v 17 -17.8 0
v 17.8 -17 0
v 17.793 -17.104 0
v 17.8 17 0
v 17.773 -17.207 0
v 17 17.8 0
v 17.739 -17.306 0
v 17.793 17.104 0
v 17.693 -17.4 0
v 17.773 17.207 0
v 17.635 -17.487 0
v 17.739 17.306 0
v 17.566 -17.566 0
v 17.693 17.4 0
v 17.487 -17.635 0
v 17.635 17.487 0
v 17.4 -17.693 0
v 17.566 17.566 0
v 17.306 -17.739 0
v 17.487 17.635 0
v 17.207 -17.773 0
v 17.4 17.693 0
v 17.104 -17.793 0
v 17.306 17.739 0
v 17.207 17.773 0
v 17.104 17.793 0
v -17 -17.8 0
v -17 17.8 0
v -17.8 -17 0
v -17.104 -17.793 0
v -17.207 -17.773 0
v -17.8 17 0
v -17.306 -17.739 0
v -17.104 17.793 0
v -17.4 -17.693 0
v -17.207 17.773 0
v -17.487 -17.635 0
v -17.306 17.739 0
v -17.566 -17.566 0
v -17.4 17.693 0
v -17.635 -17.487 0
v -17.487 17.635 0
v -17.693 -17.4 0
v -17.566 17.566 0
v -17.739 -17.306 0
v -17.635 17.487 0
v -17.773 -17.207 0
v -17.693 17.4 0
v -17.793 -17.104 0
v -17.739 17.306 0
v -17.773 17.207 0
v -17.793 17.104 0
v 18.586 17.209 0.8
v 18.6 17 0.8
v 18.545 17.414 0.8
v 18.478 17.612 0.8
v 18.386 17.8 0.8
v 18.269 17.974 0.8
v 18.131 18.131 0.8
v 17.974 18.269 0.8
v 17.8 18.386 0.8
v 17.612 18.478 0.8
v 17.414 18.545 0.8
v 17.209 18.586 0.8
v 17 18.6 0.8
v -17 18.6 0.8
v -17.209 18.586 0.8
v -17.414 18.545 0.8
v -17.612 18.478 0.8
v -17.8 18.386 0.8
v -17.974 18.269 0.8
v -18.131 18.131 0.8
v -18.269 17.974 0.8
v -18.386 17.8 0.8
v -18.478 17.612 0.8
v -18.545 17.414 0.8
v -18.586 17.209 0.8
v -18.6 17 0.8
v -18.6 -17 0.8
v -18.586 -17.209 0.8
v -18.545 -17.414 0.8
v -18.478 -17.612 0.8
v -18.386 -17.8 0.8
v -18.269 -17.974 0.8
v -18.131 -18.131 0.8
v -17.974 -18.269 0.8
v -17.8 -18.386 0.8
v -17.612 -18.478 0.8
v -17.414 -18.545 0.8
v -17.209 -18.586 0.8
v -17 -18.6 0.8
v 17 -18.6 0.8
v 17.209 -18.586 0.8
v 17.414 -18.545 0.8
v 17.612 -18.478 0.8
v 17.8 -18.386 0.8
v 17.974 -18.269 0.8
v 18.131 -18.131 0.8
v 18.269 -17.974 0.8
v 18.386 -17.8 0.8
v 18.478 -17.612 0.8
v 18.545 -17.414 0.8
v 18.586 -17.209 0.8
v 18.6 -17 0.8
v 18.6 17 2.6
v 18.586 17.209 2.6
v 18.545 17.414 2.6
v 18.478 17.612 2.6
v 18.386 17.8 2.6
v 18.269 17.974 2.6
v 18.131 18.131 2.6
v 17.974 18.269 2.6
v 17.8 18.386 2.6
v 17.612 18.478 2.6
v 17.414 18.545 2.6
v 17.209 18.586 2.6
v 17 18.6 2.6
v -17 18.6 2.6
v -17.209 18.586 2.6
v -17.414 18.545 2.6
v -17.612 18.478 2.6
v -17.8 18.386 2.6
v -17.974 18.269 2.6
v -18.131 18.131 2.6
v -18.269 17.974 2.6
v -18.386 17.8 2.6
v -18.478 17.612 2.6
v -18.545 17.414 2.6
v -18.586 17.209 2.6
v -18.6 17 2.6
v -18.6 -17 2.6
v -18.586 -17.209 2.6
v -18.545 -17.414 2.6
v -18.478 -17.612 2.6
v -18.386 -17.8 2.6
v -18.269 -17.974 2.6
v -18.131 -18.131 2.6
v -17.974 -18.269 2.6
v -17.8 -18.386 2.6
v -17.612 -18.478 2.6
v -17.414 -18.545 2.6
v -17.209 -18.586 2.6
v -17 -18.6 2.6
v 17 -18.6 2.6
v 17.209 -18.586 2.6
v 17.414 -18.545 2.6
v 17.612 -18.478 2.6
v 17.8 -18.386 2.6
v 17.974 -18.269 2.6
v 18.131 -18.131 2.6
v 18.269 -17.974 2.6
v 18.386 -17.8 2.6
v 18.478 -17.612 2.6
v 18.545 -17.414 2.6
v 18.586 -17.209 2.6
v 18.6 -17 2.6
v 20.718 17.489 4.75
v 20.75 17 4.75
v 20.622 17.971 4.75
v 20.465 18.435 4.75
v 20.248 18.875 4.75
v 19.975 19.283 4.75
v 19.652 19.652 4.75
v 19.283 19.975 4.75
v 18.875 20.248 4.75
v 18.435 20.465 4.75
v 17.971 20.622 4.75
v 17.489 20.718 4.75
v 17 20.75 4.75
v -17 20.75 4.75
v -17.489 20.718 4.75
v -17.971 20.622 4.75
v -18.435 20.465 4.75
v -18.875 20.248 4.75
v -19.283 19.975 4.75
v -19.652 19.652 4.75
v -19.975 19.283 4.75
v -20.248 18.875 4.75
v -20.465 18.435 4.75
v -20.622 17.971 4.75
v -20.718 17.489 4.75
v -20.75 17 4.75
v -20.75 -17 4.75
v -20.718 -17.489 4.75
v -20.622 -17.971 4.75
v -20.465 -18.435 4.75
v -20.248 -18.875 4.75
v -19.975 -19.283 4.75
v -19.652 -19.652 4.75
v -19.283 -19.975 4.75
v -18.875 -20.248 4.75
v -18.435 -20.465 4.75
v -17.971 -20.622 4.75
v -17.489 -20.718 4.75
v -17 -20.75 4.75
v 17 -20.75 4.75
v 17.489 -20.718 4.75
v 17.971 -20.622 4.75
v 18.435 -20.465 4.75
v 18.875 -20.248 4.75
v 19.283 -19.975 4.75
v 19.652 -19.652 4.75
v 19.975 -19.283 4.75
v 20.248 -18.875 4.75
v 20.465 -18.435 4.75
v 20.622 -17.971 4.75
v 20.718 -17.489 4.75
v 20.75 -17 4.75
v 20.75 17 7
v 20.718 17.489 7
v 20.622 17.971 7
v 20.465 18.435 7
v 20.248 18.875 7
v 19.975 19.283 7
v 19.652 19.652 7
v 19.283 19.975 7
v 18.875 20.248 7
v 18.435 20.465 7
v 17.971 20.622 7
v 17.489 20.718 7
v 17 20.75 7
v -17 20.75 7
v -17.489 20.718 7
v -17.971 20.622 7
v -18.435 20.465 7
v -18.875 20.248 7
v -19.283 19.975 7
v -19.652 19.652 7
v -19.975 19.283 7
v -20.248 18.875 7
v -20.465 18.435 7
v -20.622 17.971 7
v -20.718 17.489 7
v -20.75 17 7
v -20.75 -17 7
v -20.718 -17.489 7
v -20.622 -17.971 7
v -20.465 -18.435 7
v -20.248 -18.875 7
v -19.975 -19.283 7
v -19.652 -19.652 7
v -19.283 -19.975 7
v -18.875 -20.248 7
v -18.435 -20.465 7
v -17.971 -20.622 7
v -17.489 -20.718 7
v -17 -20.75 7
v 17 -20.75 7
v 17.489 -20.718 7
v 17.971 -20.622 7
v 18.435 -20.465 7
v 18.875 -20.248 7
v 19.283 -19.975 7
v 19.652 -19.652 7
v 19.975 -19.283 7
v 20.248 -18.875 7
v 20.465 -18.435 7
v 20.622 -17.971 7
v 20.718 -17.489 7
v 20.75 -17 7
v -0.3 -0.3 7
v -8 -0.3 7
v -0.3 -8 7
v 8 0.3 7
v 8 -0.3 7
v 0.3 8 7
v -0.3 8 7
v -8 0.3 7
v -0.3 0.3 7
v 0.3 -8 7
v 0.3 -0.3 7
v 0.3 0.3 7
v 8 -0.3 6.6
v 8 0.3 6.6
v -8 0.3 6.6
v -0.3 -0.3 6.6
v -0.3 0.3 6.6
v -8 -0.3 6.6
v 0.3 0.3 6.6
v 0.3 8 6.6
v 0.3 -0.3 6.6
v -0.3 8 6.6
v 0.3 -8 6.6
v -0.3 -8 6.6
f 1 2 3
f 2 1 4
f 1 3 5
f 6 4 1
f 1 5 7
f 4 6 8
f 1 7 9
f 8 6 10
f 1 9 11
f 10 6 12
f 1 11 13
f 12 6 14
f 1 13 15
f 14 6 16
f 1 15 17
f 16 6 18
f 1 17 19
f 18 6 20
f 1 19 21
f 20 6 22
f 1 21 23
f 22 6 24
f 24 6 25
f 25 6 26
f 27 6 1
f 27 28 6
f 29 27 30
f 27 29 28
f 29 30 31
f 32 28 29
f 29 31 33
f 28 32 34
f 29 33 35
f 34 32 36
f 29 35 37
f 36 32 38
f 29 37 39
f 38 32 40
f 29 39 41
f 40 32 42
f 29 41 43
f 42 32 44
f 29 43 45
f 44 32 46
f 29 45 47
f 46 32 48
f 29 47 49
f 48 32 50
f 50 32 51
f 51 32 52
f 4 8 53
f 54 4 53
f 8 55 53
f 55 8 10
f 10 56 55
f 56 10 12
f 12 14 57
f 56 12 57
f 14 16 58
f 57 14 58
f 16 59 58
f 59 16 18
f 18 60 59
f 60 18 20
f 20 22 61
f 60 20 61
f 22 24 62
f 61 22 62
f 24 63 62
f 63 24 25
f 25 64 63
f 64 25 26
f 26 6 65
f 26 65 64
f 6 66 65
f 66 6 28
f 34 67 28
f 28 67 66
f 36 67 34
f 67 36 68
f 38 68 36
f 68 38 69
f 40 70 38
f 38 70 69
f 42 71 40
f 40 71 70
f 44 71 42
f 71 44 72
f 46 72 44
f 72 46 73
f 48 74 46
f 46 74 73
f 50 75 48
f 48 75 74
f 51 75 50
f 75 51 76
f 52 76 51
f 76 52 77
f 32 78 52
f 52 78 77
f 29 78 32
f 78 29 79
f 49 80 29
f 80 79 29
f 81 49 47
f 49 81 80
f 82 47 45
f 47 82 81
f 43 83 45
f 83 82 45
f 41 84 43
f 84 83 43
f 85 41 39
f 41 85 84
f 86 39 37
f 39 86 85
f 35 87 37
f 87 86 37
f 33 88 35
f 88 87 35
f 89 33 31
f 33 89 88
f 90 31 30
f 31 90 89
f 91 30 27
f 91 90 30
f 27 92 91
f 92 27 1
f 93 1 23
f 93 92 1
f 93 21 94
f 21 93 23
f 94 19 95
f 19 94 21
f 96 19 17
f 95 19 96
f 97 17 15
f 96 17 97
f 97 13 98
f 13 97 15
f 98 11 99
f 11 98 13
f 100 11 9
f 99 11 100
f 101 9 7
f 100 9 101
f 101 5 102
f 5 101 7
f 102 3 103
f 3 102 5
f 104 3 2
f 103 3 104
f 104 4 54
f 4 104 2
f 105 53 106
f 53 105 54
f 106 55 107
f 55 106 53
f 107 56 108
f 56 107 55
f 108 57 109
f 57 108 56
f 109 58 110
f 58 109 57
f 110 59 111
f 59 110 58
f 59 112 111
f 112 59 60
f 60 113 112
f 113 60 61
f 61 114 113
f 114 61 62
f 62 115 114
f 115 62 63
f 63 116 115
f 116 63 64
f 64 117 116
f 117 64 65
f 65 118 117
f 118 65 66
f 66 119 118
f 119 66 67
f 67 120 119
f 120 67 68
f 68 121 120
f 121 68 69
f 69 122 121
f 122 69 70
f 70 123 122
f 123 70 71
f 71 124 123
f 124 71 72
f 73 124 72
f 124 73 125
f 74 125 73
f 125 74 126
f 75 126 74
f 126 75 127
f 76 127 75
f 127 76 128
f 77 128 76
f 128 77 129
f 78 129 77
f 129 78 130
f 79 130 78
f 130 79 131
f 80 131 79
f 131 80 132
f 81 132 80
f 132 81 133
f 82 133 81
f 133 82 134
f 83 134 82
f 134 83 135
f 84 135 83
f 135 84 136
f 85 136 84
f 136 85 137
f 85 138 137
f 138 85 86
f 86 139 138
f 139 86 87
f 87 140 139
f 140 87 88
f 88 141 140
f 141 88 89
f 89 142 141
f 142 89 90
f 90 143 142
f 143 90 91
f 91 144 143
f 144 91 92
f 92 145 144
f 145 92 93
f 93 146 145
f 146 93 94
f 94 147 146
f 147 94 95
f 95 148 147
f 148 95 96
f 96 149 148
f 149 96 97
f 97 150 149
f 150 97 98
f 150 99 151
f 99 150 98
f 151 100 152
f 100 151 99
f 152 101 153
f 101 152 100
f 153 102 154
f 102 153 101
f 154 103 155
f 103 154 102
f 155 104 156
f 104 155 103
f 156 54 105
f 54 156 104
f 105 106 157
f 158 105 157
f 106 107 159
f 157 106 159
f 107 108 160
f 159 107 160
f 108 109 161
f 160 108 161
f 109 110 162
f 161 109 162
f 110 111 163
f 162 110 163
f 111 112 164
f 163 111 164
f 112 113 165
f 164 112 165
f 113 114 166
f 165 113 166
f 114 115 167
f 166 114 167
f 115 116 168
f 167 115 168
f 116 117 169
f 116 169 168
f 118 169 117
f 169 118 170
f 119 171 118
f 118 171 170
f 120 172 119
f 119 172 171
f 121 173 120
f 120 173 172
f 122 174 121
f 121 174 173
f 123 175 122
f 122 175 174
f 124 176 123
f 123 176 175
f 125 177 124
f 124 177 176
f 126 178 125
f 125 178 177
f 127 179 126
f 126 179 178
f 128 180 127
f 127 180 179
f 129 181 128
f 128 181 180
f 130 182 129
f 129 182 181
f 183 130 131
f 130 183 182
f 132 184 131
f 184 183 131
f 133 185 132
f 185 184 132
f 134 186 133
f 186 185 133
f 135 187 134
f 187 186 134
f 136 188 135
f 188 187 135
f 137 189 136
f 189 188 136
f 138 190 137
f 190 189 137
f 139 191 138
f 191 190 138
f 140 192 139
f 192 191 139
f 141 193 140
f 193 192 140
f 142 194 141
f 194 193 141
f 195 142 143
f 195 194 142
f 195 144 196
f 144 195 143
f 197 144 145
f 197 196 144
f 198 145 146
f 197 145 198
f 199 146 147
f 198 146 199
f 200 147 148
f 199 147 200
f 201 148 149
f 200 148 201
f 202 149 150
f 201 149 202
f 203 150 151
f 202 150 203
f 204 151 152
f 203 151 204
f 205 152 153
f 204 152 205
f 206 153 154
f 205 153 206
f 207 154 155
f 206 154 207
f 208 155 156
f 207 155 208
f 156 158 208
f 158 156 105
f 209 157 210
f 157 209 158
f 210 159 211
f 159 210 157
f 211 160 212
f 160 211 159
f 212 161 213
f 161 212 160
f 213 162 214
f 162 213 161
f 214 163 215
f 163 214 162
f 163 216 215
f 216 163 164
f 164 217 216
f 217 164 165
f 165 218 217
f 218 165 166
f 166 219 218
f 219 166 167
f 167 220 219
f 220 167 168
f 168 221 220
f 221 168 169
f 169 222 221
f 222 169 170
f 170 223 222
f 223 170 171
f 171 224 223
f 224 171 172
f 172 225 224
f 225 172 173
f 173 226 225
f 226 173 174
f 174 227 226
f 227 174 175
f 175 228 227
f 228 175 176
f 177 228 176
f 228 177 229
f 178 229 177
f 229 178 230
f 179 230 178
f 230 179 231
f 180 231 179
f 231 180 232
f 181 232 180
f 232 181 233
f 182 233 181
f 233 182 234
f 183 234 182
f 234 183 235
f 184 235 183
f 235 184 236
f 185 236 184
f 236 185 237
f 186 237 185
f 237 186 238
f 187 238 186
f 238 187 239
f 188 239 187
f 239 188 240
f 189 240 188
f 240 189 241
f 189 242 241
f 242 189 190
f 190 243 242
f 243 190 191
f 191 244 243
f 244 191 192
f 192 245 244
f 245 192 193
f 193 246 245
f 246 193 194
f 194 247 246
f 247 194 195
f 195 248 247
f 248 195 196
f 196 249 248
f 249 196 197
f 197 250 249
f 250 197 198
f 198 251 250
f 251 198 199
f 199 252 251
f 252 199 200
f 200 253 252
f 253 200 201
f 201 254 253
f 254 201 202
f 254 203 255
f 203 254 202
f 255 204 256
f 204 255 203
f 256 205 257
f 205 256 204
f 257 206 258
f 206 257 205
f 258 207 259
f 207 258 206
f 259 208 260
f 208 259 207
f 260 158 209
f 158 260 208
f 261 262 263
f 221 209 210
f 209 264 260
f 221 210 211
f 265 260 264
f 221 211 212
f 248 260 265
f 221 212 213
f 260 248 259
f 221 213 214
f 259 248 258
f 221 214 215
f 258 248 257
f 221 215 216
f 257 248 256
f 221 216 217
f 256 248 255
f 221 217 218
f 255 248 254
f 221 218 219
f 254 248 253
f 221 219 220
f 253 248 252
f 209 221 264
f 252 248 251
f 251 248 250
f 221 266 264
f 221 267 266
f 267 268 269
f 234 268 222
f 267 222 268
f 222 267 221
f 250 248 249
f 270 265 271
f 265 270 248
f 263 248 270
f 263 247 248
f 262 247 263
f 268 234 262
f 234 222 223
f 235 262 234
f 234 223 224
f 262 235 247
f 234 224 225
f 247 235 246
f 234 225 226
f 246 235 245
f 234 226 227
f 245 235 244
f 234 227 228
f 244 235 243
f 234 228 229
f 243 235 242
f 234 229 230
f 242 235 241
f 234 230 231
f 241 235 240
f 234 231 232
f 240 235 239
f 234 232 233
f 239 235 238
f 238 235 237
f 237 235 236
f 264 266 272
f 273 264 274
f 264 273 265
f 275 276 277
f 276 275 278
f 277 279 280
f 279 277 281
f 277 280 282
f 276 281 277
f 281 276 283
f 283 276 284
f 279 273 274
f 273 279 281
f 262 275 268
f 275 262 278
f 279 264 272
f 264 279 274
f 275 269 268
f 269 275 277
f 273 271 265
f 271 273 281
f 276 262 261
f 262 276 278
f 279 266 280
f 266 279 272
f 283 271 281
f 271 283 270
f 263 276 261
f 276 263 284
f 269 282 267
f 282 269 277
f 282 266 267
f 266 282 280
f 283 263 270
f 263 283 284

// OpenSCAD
// Lab 2: 1 x 1 Gridfinity calibration print candidate.
// Nominal foot dimensions follow kennetek/gridfinity-rebuilt-openscad,
// src/core/standard.scad (MIT License, Copyright 2023 Kenneth Hodson):
// https://github.com/kennetek/gridfinity-rebuilt-openscad/blob/main/src/core/standard.scad
// The same 0.8 / 1.8 / 2.15 mm profile is specified for this rig in
// ../docs/MG 400 rakis.md, section 5. This file implements the profile
// independently; it does not copy the library's source code.

// All dimensions are in mm. Physical Gridfinity fit is untested.

grid_pitch = 42;
nominal_top_width = 41.5;
nominal_top_radius = 3.75;
nominal_lower_chamfer = 0.8;
nominal_vertical_wall = 1.8;
nominal_upper_chamfer = 2.15;
nominal_profile_height = nominal_lower_chamfer
                       + nominal_vertical_wall
                       + nominal_upper_chamfer; // 4.75 mm
nominal_bridge_height = 7 - nominal_profile_height; // 2.25 mm

// Provisional printer/fit adjustment for the FIRST physical Gridfinity test.
// This is a radial/per-side inward offset in X and Y; each full width is
// reduced by 2 * fit_adjustment. It is NOT a calibrated clearance.
// Start at the library's nominal geometry (0 mm); change only after testing.
// Lab 1 observed free motion at 0.4 mm and binding at 0.2 mm in a DIFFERENT
// cube test. It did not test 0.3 mm or establish the Gridfinity foot fit.
fit_adjustment = 0;

// A recessed cross marks the geometric cell centre (X = 0, Y = 0).
// It prints on the flat upper surface without supports.
target_length = 16;
target_width = 0.6;
target_depth = 0.4;

corner_segments = 12;

nominal_bottom_width = nominal_top_width
                     - 2 * (nominal_lower_chamfer + nominal_upper_chamfer);
nominal_bottom_radius = nominal_top_radius
                      - nominal_lower_chamfer - nominal_upper_chamfer;
nominal_middle_width = nominal_bottom_width + 2 * nominal_lower_chamfer;
nominal_middle_radius = nominal_bottom_radius + nominal_lower_chamfer;
total_height = nominal_profile_height + nominal_bridge_height;

// A rounded-square ring, counter-clockwise when viewed from above.
// Applying one inward offset to all rings retains both 45-degree slopes.
function ring_points(width, radius, z) = [
    for (corner = [0 : 3], step = [0 : corner_segments])
        let(
            angle = 90 * corner + 90 * step / corner_segments,
            centre_x = (corner == 0 || corner == 3) ? width/2 - radius : -width/2 + radius,
            centre_y = (corner == 0 || corner == 1) ? width/2 - radius : -width/2 + radius
        )
        [centre_x + radius * cos(angle),
         centre_y + radius * sin(angle), z]
];

// Distinct nominal levels: lower 45-degree chamfer, vertical band, upper
// 45-degree chamfer, then the 2.25 mm bridge to a simple flat top.
levels = [
    [0, nominal_bottom_width, nominal_bottom_radius],
    [nominal_lower_chamfer, nominal_middle_width, nominal_middle_radius],
    [nominal_lower_chamfer + nominal_vertical_wall,
     nominal_middle_width, nominal_middle_radius],
    [nominal_profile_height, nominal_top_width, nominal_top_radius],
    [total_height, nominal_top_width, nominal_top_radius]
];

points_per_ring = 4 * (corner_segments + 1);

module standard_profile_with_test_adjustment() {
    polyhedron(
        points = [
            for (level = levels)
                each ring_points(level[1] - 2 * fit_adjustment,
                                 level[2] - fit_adjustment,
                                 level[0])
        ],
        faces = concat(
            [[for (i = [points_per_ring - 1 : -1 : 0]) i]],
            [for (level = [0 : len(levels) - 2], i = [0 : points_per_ring - 1])
                each [
                    [level * points_per_ring + i,
                     level * points_per_ring + (i + 1) % points_per_ring,
                     (level + 1) * points_per_ring + (i + 1) % points_per_ring],
                    [level * points_per_ring + i,
                     (level + 1) * points_per_ring + (i + 1) % points_per_ring,
                     (level + 1) * points_per_ring + i]
                ]],
            [[for (i = [0 : points_per_ring - 1])
                (len(levels) - 1) * points_per_ring + i]]
        ),
        convexity = 4
    );
}

assert(grid_pitch == 42 && nominal_top_width == 41.5,
       "Check nominal Gridfinity size against the cited source.");
assert(abs(nominal_profile_height - 4.75) < 0.000001
       && nominal_bottom_radius > 0,
       "Invalid nominal Gridfinity foot profile.");
assert(fit_adjustment >= 0 && fit_adjustment < nominal_bottom_radius,
       "Fit adjustment must leave a positive bottom corner radius.");
assert(target_width > 0 && target_width < target_length
       && target_length < nominal_top_width - 2 * fit_adjustment,
       "Invalid cross dimensions.");
assert(target_depth > 0 && target_depth < nominal_bridge_height,
       "Cross must not cut into the Gridfinity foot profile.");

difference() {
    standard_profile_with_test_adjustment();
    translate([-target_length/2, -target_width/2, total_height - target_depth])
        cube([target_length, target_width, target_depth + 0.1]);
    translate([-target_width/2, -target_length/2, total_height - target_depth])
        cube([target_width, target_length, target_depth + 0.1]);
}
